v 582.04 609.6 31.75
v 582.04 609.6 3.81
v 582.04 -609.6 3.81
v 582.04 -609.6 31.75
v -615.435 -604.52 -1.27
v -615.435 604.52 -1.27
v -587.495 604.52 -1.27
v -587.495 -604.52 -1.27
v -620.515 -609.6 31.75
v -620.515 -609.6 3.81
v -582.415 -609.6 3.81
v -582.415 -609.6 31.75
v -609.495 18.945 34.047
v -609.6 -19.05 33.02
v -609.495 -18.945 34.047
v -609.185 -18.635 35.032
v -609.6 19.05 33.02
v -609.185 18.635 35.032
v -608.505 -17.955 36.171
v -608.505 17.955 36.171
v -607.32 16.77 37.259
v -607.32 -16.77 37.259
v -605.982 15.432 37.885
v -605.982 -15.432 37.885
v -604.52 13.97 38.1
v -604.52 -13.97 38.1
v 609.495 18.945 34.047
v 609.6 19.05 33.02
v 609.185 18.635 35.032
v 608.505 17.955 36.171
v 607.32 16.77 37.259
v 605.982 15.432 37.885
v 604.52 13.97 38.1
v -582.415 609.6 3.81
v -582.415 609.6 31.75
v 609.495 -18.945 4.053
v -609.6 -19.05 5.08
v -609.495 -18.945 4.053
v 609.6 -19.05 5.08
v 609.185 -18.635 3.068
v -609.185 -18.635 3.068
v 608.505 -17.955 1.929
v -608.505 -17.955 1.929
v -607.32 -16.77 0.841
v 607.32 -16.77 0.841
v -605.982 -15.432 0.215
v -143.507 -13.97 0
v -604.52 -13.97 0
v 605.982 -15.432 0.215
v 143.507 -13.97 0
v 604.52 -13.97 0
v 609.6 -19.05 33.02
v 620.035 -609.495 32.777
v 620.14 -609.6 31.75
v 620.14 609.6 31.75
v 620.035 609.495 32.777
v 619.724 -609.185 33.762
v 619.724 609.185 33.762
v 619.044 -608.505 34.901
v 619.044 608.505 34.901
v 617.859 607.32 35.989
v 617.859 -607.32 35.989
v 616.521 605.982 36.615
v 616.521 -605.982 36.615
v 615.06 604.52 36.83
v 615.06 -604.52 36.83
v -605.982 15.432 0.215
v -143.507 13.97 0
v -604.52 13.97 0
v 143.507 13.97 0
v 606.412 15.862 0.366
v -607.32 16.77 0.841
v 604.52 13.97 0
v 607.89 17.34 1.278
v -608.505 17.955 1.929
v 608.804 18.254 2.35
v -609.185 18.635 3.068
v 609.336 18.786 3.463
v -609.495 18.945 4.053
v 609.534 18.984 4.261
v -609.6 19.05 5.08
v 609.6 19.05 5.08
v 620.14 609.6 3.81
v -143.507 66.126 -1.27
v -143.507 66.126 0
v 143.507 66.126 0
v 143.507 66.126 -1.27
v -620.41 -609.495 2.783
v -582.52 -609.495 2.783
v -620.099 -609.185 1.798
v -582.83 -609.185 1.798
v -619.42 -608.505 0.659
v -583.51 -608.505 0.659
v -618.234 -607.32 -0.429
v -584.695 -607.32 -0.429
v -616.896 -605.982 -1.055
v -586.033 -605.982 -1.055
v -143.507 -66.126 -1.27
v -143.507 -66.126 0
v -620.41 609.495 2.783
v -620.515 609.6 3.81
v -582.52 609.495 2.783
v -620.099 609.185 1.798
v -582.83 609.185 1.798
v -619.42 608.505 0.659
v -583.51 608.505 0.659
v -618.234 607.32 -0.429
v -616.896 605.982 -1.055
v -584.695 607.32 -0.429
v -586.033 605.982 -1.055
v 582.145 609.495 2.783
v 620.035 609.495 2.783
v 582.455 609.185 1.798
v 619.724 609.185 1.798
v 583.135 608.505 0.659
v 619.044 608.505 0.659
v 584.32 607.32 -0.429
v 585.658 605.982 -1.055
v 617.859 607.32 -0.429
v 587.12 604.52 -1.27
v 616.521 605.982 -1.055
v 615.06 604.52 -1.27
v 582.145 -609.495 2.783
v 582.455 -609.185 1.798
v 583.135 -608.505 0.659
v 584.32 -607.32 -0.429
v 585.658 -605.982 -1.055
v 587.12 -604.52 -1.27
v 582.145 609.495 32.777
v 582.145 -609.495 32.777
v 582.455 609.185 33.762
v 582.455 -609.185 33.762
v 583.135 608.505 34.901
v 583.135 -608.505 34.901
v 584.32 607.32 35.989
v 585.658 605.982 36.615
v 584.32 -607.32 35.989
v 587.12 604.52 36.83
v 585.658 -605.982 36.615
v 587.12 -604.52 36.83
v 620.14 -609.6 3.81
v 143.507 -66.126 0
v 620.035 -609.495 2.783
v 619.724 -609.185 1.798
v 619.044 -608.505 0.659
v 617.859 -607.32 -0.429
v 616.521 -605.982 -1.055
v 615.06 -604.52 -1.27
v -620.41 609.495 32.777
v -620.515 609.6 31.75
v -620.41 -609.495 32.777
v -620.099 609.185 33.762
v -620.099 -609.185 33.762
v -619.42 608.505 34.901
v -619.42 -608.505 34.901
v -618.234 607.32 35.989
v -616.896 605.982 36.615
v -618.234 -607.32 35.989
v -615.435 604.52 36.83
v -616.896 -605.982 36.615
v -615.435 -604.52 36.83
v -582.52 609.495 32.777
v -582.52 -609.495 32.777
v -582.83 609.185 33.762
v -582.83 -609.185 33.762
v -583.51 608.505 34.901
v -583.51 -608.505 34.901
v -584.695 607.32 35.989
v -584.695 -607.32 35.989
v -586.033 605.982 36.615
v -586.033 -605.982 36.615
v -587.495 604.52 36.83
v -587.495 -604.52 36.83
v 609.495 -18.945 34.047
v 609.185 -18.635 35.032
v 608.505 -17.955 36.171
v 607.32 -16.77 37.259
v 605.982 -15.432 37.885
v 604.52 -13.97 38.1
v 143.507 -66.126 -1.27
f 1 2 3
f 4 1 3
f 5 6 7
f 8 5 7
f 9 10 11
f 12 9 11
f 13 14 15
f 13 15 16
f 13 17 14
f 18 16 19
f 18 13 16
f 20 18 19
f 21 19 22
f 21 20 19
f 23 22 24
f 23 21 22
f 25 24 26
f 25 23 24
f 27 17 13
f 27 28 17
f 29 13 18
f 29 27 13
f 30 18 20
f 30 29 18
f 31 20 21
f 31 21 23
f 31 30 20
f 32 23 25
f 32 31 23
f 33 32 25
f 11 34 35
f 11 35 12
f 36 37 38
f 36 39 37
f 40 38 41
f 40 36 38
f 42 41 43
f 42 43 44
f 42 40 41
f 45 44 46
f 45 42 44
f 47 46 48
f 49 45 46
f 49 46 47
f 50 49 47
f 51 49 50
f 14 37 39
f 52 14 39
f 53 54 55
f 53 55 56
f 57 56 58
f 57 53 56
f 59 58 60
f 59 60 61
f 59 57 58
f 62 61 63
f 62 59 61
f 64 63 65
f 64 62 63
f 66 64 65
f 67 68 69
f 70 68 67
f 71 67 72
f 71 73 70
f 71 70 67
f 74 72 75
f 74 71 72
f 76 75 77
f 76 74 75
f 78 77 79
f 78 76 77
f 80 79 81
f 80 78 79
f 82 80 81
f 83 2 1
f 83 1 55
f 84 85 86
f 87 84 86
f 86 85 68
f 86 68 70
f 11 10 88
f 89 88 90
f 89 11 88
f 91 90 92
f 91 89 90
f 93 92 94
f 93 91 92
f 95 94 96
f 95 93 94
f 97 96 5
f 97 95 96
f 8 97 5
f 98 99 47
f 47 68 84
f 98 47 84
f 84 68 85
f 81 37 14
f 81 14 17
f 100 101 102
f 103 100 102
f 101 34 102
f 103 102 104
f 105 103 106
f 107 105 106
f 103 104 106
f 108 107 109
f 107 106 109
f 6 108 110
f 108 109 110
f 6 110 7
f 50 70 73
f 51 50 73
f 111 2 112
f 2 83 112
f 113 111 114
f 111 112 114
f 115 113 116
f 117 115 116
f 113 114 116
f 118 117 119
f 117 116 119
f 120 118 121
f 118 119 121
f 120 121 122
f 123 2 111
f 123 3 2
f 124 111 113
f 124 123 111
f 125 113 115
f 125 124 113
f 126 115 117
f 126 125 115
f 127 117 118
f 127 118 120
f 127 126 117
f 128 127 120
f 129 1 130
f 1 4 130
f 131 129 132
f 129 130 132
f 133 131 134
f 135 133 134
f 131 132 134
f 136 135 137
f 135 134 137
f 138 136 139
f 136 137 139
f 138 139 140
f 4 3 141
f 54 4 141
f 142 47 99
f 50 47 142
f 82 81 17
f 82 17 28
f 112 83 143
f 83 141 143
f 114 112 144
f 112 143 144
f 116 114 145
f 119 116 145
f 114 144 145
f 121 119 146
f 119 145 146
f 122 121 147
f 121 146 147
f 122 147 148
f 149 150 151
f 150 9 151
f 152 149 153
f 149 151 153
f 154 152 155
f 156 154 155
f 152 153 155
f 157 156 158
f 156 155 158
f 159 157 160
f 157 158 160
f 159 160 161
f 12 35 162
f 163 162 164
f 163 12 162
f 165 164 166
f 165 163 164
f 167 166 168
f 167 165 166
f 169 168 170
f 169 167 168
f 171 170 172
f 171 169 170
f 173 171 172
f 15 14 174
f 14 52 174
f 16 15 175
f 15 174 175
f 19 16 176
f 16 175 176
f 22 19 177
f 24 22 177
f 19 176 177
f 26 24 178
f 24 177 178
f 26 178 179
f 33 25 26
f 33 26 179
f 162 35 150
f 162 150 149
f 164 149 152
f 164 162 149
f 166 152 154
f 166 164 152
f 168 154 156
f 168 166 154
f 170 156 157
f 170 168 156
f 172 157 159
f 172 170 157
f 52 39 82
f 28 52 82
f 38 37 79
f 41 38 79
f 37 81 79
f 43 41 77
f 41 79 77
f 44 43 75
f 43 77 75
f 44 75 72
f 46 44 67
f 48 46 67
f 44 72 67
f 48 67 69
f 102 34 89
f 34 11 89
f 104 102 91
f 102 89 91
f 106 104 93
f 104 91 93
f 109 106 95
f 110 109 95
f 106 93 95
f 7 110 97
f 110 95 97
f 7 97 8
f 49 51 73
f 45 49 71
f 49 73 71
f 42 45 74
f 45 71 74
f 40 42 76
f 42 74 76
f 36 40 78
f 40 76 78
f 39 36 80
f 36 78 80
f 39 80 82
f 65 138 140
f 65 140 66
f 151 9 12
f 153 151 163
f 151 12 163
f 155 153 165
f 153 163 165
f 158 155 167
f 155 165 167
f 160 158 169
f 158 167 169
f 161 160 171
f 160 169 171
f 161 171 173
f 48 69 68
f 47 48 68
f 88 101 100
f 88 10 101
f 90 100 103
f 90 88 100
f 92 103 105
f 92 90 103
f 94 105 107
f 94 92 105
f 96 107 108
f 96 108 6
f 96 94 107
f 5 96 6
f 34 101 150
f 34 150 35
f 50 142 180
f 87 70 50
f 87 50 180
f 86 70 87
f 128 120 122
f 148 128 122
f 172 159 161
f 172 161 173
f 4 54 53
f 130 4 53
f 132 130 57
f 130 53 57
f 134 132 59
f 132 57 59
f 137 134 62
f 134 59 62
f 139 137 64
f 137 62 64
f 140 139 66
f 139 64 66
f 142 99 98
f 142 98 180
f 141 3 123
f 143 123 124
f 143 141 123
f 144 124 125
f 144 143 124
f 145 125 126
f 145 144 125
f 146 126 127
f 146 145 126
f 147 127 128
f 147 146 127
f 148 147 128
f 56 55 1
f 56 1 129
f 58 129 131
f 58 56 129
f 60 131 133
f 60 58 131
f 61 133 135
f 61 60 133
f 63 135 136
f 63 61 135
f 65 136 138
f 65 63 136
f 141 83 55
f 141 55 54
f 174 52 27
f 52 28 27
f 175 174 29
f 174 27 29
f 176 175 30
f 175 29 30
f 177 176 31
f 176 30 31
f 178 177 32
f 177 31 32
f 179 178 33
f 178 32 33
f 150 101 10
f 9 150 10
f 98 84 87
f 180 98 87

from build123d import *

# Parameters (mm, degrees)
F0_W     = 1219.2
F0_H     = 38.1
F1_DEPTH = 38.1
F2_R     = 5.08
F3_R     = 5.08
F4_W     = 287.014722
F4_H     = 132.251978
F5_DEPTH = 1.27
F6_W     = 38.1
F6_H     = 1219.2
F7_DEPTH = 38.1
F8_R     = 5.08


with BuildPart() as f1:
    # F0 (on Top) → F1 (new body)
    with BuildSketch(Plane.XY):
        Rectangle(F0_W, F0_H)
    extrude(amount=F1_DEPTH)

    # F2
    f2_edges = [f1.edges().sort_by_distance(p)[0] for p in [
        (-609.6, 0, 38.1),
        (0, -19.05, 38.1),
        (609.6, 0, 38.1),
        (0, 19.05, 38.1),
    ]]
    fillet(f2_edges, radius=F2_R)

    # F3
    f3_edges = [f1.edges().sort_by_distance(p)[0] for p in [
        (-609.6, 0, 0),
        (0, 19.05, 0),
        (0, -19.05, 0),
        (609.6, 0, 0),
    ]]
    fillet(f3_edges, radius=F3_R)

    # F4 (on Top) → F5 (join)
    with BuildSketch(Plane.XY):
        Rectangle(F4_W, F4_H)
    extrude(amount=-F5_DEPTH)


with BuildPart() as f7:
    # F6 (on face) → F7 (new body)
    with BuildSketch(Plane(origin=(0, 0, -1.27), x_dir=(1, 0, 0), z_dir=(0, 0, -1))):
        with Locations((-601.464927, 0)):
            Rectangle(F6_W, F6_H)
        with Locations((601.089597, 0)):
            Rectangle(F6_W, F6_H)
    extrude(amount=-F7_DEPTH)

    # F8
    f8_edges = [f7.edges().sort_by_distance(p)[0] for p in [
        (-620.514927, 0, -1.27),
        (-582.414927, 0, -1.27),
        (-601.464927, -609.6, -1.27),
        (-601.464927, 609.6, -1.27),
        (601.089597, 609.6, -1.27),
        (582.039597, 0, -1.27),
        (620.139597, 0, -1.27),
        (601.089597, -609.6, -1.27),
        (-601.464927, -609.6, 36.83),
        (-582.414927, 0, 36.83),
        (-620.514927, 0, 36.83),
        (-601.464927, 609.6, 36.83),
        (601.089597, 609.6, 36.83),
        (620.139597, 0, 36.83),
        (582.039597, 0, 36.83),
        (601.089597, -609.6, 36.83),
    ]]
    fillet(f8_edges, radius=F8_R)


solid = Compound([f1.part, f7.part])
